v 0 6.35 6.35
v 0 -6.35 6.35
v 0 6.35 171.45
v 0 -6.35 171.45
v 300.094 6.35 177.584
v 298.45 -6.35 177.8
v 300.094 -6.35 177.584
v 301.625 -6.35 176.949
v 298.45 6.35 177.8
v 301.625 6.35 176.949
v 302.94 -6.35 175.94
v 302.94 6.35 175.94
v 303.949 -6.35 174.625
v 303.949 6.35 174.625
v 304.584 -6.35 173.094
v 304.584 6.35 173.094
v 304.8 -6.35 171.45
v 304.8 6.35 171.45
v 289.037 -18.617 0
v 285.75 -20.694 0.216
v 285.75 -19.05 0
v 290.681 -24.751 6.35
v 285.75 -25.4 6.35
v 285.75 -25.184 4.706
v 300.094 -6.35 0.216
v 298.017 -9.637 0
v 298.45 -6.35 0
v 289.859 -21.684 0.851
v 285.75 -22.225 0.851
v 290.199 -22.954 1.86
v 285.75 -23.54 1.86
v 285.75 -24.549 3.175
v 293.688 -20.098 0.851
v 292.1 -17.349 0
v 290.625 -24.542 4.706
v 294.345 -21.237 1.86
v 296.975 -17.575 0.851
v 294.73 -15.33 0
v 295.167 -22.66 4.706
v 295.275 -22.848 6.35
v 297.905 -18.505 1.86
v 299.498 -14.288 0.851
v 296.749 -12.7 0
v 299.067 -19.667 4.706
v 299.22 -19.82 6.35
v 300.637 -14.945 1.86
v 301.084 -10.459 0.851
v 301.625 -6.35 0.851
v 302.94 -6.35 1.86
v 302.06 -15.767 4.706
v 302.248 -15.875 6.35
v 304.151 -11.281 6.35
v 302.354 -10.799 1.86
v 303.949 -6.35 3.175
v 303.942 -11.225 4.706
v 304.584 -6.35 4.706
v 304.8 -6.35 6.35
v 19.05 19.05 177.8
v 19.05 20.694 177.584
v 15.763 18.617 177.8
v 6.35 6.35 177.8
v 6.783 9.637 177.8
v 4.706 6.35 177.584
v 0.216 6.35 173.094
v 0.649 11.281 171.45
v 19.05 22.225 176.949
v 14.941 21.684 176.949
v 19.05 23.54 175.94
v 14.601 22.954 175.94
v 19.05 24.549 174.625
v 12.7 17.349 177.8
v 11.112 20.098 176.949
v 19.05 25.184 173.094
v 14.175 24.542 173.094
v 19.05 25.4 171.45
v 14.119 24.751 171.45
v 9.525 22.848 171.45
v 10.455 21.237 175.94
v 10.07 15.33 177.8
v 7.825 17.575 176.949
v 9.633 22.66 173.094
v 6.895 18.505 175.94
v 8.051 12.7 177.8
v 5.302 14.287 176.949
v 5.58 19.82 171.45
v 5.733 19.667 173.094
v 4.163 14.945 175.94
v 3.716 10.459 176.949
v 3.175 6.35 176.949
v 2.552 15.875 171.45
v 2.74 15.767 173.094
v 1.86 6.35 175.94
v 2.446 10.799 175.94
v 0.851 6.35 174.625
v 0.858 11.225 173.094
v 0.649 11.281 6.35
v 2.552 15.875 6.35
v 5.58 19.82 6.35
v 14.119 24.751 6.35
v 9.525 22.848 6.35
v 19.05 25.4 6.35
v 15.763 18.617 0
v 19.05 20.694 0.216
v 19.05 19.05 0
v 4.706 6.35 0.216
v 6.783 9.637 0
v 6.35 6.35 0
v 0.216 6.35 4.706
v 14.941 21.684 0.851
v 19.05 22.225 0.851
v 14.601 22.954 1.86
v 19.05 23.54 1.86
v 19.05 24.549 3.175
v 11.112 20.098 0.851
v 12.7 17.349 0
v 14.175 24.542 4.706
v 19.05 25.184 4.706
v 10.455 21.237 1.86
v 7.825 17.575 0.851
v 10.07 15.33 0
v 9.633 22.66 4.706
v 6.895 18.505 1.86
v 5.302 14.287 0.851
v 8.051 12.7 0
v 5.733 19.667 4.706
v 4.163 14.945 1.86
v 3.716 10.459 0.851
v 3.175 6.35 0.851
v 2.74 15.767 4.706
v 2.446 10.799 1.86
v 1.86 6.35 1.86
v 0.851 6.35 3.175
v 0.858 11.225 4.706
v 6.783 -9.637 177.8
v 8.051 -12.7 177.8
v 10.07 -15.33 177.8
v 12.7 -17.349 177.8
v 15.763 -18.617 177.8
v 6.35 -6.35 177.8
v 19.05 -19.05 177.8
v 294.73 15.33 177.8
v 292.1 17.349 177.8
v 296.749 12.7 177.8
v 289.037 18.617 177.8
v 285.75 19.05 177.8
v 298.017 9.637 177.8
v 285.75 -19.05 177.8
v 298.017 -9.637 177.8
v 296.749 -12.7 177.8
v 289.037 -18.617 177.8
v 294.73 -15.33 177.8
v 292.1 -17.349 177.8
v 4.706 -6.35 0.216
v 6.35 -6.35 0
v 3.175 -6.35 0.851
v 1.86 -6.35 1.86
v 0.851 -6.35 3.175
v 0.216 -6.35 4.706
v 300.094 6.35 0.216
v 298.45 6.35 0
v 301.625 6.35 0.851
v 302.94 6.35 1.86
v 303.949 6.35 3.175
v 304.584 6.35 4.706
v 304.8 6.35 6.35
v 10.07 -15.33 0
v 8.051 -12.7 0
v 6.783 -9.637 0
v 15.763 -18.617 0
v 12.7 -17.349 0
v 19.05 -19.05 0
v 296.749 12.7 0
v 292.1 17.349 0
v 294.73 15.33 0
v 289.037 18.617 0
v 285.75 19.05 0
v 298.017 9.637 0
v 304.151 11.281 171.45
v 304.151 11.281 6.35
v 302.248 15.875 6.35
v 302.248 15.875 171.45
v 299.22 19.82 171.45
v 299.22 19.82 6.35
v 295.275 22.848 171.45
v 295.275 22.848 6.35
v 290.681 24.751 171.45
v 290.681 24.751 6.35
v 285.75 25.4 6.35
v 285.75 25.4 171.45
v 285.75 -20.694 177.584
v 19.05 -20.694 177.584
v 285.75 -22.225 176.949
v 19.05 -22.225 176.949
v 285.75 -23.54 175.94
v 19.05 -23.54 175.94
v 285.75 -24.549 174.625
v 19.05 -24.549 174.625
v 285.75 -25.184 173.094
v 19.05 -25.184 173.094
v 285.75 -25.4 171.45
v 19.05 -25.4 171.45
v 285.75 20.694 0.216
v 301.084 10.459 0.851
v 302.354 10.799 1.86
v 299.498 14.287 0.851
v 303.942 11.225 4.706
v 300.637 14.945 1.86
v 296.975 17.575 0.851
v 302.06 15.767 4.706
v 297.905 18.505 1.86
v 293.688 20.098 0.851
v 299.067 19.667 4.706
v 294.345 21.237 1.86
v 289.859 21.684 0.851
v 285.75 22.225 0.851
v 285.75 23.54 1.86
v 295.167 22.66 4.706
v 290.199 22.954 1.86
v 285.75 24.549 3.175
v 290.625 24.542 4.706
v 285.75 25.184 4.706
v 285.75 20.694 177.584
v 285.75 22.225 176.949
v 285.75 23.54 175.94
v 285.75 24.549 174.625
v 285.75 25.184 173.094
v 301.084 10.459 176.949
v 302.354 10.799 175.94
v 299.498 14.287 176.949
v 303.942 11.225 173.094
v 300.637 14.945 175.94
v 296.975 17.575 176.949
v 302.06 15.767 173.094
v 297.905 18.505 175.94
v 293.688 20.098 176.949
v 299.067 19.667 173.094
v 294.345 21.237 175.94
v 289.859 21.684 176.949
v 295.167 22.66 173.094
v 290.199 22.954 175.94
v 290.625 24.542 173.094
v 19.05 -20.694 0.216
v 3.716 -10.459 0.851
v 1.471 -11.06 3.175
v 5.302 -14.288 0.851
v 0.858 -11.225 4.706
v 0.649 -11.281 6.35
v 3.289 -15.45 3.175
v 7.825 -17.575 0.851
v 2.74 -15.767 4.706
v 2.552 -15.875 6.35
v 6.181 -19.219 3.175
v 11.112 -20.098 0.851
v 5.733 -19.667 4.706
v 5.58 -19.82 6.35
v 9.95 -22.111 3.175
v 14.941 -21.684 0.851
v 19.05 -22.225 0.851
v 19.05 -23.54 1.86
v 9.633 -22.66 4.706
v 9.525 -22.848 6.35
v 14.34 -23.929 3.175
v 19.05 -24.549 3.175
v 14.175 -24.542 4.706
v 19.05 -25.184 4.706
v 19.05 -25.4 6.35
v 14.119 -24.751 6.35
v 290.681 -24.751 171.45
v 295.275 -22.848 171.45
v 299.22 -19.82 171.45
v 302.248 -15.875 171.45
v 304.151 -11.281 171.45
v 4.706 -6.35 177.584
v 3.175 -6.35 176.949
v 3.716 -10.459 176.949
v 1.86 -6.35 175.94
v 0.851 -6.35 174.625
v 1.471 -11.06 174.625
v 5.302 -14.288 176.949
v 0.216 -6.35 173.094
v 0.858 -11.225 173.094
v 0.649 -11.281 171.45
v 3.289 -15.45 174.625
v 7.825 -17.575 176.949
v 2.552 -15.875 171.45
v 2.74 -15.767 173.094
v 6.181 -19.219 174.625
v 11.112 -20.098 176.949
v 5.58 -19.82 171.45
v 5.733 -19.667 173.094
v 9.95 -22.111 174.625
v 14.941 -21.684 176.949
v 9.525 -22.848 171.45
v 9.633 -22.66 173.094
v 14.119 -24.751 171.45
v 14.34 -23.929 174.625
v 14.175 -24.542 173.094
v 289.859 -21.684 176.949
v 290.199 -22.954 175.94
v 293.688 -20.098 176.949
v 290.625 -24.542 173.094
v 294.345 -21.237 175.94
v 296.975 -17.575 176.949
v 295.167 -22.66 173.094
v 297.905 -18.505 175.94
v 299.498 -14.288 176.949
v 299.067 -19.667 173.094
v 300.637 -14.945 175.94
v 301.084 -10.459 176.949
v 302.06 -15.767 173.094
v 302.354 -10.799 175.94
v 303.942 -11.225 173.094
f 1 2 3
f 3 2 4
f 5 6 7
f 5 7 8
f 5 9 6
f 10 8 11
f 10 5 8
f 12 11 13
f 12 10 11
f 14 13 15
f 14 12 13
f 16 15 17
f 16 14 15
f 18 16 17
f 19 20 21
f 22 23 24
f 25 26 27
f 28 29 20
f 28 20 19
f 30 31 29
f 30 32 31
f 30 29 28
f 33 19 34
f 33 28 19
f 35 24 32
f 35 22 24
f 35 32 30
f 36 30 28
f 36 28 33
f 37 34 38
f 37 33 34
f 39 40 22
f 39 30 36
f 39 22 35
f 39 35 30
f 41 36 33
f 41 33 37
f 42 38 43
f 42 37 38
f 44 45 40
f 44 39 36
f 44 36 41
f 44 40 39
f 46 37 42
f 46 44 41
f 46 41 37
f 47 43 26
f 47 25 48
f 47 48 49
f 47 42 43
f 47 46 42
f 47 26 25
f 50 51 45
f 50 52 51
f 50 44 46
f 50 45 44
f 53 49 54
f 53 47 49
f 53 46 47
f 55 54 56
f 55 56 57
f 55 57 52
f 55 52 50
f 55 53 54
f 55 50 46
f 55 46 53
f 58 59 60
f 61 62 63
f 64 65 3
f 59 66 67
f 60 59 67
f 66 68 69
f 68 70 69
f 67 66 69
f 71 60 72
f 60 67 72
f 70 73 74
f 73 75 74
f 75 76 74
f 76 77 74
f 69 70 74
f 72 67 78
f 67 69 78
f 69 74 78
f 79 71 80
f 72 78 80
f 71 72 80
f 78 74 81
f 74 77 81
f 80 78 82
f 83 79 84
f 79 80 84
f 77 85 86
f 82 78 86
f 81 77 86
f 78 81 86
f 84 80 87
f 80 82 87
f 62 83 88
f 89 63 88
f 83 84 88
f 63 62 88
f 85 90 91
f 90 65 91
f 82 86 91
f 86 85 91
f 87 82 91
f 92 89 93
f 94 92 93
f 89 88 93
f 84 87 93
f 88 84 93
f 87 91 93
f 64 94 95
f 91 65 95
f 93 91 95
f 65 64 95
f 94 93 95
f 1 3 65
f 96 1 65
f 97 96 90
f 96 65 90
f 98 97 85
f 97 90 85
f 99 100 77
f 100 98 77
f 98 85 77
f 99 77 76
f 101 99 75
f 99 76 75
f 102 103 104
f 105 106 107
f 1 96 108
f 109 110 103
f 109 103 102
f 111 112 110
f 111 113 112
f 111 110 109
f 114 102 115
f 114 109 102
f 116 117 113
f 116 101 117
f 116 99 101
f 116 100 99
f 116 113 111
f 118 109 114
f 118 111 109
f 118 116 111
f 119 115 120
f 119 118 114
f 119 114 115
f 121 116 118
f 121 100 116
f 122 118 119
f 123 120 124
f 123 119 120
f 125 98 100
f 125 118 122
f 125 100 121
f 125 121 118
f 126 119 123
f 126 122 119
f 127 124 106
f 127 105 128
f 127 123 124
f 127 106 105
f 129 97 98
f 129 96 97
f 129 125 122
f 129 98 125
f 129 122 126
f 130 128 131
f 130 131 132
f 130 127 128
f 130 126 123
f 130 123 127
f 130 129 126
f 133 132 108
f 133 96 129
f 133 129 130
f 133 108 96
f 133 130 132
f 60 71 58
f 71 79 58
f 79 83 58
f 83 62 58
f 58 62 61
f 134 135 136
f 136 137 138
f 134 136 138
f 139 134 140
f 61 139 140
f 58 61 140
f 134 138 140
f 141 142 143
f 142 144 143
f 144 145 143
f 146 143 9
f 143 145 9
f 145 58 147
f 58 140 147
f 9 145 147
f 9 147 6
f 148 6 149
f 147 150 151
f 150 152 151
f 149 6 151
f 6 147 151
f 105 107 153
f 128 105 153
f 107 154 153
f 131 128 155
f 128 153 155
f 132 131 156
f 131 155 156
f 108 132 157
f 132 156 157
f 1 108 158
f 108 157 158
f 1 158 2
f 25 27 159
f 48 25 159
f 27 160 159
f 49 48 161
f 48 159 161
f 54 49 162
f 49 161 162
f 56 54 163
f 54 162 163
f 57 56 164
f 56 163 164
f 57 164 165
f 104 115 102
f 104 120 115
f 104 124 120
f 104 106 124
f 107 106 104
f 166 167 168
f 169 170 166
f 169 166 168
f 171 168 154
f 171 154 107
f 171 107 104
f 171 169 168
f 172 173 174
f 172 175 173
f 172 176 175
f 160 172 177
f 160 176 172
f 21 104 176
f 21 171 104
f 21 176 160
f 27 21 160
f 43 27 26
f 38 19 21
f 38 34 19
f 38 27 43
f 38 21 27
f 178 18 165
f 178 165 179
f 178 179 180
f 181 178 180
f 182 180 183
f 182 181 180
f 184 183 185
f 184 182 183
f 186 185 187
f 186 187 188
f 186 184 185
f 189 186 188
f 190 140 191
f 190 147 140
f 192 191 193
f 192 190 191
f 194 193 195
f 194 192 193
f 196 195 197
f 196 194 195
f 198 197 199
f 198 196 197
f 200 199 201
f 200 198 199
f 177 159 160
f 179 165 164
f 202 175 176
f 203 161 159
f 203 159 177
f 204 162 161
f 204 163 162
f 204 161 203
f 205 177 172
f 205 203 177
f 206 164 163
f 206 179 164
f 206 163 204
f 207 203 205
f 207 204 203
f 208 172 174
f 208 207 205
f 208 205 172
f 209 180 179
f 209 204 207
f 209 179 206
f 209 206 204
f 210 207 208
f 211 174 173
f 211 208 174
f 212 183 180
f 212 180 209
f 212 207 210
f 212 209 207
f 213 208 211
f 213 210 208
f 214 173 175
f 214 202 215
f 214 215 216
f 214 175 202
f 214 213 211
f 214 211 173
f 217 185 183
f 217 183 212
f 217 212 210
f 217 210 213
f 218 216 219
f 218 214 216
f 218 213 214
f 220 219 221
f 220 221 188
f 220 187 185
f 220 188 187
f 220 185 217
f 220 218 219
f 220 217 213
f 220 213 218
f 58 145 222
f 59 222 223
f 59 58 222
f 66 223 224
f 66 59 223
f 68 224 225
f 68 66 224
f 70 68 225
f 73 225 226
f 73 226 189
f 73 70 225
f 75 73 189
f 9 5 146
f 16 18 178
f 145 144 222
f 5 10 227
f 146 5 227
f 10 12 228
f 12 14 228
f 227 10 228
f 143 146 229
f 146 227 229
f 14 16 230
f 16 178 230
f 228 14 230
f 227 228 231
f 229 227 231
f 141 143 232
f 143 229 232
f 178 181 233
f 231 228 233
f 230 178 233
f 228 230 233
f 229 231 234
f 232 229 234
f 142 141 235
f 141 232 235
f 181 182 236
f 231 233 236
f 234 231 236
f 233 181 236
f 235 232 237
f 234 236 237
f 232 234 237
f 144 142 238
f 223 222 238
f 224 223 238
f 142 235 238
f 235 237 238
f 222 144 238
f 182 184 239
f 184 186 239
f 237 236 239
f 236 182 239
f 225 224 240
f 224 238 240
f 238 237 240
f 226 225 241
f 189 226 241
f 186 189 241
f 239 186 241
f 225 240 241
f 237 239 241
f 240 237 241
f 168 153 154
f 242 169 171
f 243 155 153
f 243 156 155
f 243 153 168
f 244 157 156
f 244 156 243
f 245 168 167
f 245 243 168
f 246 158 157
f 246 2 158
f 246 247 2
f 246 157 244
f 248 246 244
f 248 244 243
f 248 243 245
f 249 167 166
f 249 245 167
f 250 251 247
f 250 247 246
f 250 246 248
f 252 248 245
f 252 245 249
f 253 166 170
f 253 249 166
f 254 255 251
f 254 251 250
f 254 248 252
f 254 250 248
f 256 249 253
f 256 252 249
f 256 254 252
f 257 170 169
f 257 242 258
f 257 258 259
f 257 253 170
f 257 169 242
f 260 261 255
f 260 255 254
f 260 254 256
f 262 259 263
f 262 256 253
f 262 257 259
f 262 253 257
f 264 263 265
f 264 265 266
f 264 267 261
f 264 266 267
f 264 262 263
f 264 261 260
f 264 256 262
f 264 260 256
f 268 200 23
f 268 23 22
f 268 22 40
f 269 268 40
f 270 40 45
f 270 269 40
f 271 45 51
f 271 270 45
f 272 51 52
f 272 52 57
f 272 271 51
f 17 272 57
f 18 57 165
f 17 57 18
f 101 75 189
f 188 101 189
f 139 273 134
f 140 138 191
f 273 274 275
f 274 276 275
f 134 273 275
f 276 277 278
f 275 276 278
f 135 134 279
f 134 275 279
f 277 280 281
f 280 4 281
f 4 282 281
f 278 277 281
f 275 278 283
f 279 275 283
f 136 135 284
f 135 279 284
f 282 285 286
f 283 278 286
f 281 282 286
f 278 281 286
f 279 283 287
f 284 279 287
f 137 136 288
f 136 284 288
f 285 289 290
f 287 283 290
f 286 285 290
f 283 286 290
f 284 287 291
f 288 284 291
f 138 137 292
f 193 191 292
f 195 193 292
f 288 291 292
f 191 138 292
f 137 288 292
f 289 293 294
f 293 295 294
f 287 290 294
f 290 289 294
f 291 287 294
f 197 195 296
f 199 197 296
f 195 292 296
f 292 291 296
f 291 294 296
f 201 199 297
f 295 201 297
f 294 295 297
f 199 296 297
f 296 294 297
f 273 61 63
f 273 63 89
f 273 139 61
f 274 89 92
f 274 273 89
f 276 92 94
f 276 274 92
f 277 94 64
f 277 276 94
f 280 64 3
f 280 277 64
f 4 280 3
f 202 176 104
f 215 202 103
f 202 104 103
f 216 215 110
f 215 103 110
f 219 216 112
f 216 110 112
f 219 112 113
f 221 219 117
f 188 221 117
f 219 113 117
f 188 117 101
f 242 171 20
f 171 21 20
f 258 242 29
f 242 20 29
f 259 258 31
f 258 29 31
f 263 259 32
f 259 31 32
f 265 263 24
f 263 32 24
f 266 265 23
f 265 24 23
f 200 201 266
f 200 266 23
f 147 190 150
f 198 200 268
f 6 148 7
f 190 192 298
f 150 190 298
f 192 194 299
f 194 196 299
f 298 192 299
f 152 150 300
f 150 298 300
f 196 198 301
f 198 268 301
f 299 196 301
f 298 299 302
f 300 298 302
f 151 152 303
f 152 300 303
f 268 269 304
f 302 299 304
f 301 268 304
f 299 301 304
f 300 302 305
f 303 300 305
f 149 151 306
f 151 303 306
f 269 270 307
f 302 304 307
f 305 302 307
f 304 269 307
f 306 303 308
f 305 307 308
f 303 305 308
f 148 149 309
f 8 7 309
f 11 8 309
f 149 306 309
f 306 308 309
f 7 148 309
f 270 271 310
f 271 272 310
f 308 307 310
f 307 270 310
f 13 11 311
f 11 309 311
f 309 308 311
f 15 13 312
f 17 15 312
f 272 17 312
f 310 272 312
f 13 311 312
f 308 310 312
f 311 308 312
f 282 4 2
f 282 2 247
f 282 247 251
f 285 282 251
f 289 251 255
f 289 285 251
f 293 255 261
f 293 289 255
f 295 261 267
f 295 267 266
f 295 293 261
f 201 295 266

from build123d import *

# Parameters (mm, degrees)
F0_W     = 304.8
F0_H     = 177.8
F1_DEPTH = 25.4
F2_R     = 19.05
F3_R     = 6.35


with BuildPart() as f1:
    # F0 (on Front) → F1 (new body, symmetric)
    with BuildSketch(Plane.XZ):
        with Locations((152.4, 88.9)):
            Rectangle(F0_W, F0_H)
    extrude(amount=F1_DEPTH, both=True)

    # F2
    f2_edges = [f1.edges().sort_by_distance(p)[0] for p in [
        (304.8, -25.4, 88.9),
        (304.8, 25.4, 88.9),
        (0, 25.4, 88.9),
        (0, -25.4, 88.9),
    ]]
    fillet(f2_edges, radius=F2_R)

    # F3
    f3_edges = [f1.edges().sort_by_distance(p)[0] for p in [
        (152.4, -25.4, 177.8),
        (152.4, -25.4, 0),
    ]]
    fillet(f3_edges, radius=F3_R)


solid = f1.part
